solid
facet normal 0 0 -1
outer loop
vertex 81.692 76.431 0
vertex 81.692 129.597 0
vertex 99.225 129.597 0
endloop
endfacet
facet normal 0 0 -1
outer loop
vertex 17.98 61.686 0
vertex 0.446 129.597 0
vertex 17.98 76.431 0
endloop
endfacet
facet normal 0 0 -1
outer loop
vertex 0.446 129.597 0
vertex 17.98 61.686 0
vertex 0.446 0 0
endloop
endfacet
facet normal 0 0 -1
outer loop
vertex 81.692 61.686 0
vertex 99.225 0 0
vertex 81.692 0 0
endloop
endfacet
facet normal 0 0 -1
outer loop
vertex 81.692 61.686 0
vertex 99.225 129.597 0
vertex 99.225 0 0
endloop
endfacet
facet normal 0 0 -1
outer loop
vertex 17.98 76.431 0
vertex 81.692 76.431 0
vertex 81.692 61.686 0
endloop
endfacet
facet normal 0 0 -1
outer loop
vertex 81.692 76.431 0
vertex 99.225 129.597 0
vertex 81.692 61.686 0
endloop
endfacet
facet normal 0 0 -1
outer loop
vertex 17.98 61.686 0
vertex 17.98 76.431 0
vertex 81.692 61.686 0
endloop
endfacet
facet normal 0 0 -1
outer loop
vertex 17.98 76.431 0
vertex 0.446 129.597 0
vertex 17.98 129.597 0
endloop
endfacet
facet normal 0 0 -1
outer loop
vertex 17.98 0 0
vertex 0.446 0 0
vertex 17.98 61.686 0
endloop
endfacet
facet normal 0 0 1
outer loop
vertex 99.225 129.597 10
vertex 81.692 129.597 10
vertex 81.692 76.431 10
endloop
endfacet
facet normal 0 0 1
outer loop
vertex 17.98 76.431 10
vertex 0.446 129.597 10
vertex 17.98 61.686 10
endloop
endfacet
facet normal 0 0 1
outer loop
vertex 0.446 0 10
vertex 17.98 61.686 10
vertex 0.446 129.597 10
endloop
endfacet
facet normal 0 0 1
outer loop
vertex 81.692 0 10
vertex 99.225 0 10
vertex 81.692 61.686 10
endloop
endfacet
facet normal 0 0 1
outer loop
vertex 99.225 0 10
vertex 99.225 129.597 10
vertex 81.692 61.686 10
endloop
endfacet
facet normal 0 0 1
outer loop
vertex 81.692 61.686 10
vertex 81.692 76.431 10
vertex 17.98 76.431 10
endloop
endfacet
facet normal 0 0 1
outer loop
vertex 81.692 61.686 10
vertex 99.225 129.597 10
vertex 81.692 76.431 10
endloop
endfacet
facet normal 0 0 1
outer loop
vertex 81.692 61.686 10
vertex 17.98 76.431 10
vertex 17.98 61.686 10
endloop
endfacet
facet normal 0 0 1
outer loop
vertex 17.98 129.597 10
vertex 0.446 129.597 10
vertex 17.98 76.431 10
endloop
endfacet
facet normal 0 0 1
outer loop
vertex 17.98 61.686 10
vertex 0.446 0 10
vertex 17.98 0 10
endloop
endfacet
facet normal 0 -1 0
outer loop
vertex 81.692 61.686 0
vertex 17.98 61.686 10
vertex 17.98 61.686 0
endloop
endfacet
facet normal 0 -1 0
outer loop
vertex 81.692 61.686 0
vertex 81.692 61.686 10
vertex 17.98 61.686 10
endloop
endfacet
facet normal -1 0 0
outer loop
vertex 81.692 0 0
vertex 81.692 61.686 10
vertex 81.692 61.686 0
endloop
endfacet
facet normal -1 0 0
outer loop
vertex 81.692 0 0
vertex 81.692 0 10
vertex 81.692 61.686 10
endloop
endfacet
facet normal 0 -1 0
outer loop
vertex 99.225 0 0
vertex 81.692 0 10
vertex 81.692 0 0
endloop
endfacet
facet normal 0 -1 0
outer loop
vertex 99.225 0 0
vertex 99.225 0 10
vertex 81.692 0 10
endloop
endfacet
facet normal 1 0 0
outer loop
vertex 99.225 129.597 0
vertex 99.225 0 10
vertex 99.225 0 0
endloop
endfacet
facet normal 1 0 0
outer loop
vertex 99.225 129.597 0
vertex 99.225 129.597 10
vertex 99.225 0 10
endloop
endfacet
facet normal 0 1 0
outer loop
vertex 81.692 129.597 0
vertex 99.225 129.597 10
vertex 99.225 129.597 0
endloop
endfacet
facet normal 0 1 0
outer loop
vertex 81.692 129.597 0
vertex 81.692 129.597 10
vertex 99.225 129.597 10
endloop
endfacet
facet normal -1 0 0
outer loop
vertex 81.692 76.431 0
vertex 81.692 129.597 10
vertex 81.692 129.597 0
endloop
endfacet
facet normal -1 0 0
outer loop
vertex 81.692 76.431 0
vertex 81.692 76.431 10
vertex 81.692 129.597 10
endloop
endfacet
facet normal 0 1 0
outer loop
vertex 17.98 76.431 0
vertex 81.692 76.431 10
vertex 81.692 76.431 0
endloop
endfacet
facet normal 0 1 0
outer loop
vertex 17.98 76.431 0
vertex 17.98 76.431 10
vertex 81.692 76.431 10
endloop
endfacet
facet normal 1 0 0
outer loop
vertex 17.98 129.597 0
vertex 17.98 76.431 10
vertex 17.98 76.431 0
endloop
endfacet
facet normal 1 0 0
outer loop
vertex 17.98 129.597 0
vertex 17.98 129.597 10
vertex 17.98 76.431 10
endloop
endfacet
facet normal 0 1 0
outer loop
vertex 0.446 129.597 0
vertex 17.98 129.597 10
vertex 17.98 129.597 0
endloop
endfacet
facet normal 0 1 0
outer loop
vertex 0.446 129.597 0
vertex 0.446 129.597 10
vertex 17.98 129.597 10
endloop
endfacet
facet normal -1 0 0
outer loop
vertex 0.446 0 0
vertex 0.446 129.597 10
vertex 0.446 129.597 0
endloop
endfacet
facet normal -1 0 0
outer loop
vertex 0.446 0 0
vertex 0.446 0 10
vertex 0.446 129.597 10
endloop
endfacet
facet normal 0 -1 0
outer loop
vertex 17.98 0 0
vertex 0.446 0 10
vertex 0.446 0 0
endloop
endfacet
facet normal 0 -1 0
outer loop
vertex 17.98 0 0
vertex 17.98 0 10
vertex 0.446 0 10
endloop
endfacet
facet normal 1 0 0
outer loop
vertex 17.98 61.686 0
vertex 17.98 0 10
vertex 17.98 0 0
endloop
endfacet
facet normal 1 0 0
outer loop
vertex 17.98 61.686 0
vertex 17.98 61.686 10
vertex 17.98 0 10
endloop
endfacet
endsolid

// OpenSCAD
translate([-17, 0, 0])
linear_extrude(height = 10)
text("H", 128, "Nunito Light");
